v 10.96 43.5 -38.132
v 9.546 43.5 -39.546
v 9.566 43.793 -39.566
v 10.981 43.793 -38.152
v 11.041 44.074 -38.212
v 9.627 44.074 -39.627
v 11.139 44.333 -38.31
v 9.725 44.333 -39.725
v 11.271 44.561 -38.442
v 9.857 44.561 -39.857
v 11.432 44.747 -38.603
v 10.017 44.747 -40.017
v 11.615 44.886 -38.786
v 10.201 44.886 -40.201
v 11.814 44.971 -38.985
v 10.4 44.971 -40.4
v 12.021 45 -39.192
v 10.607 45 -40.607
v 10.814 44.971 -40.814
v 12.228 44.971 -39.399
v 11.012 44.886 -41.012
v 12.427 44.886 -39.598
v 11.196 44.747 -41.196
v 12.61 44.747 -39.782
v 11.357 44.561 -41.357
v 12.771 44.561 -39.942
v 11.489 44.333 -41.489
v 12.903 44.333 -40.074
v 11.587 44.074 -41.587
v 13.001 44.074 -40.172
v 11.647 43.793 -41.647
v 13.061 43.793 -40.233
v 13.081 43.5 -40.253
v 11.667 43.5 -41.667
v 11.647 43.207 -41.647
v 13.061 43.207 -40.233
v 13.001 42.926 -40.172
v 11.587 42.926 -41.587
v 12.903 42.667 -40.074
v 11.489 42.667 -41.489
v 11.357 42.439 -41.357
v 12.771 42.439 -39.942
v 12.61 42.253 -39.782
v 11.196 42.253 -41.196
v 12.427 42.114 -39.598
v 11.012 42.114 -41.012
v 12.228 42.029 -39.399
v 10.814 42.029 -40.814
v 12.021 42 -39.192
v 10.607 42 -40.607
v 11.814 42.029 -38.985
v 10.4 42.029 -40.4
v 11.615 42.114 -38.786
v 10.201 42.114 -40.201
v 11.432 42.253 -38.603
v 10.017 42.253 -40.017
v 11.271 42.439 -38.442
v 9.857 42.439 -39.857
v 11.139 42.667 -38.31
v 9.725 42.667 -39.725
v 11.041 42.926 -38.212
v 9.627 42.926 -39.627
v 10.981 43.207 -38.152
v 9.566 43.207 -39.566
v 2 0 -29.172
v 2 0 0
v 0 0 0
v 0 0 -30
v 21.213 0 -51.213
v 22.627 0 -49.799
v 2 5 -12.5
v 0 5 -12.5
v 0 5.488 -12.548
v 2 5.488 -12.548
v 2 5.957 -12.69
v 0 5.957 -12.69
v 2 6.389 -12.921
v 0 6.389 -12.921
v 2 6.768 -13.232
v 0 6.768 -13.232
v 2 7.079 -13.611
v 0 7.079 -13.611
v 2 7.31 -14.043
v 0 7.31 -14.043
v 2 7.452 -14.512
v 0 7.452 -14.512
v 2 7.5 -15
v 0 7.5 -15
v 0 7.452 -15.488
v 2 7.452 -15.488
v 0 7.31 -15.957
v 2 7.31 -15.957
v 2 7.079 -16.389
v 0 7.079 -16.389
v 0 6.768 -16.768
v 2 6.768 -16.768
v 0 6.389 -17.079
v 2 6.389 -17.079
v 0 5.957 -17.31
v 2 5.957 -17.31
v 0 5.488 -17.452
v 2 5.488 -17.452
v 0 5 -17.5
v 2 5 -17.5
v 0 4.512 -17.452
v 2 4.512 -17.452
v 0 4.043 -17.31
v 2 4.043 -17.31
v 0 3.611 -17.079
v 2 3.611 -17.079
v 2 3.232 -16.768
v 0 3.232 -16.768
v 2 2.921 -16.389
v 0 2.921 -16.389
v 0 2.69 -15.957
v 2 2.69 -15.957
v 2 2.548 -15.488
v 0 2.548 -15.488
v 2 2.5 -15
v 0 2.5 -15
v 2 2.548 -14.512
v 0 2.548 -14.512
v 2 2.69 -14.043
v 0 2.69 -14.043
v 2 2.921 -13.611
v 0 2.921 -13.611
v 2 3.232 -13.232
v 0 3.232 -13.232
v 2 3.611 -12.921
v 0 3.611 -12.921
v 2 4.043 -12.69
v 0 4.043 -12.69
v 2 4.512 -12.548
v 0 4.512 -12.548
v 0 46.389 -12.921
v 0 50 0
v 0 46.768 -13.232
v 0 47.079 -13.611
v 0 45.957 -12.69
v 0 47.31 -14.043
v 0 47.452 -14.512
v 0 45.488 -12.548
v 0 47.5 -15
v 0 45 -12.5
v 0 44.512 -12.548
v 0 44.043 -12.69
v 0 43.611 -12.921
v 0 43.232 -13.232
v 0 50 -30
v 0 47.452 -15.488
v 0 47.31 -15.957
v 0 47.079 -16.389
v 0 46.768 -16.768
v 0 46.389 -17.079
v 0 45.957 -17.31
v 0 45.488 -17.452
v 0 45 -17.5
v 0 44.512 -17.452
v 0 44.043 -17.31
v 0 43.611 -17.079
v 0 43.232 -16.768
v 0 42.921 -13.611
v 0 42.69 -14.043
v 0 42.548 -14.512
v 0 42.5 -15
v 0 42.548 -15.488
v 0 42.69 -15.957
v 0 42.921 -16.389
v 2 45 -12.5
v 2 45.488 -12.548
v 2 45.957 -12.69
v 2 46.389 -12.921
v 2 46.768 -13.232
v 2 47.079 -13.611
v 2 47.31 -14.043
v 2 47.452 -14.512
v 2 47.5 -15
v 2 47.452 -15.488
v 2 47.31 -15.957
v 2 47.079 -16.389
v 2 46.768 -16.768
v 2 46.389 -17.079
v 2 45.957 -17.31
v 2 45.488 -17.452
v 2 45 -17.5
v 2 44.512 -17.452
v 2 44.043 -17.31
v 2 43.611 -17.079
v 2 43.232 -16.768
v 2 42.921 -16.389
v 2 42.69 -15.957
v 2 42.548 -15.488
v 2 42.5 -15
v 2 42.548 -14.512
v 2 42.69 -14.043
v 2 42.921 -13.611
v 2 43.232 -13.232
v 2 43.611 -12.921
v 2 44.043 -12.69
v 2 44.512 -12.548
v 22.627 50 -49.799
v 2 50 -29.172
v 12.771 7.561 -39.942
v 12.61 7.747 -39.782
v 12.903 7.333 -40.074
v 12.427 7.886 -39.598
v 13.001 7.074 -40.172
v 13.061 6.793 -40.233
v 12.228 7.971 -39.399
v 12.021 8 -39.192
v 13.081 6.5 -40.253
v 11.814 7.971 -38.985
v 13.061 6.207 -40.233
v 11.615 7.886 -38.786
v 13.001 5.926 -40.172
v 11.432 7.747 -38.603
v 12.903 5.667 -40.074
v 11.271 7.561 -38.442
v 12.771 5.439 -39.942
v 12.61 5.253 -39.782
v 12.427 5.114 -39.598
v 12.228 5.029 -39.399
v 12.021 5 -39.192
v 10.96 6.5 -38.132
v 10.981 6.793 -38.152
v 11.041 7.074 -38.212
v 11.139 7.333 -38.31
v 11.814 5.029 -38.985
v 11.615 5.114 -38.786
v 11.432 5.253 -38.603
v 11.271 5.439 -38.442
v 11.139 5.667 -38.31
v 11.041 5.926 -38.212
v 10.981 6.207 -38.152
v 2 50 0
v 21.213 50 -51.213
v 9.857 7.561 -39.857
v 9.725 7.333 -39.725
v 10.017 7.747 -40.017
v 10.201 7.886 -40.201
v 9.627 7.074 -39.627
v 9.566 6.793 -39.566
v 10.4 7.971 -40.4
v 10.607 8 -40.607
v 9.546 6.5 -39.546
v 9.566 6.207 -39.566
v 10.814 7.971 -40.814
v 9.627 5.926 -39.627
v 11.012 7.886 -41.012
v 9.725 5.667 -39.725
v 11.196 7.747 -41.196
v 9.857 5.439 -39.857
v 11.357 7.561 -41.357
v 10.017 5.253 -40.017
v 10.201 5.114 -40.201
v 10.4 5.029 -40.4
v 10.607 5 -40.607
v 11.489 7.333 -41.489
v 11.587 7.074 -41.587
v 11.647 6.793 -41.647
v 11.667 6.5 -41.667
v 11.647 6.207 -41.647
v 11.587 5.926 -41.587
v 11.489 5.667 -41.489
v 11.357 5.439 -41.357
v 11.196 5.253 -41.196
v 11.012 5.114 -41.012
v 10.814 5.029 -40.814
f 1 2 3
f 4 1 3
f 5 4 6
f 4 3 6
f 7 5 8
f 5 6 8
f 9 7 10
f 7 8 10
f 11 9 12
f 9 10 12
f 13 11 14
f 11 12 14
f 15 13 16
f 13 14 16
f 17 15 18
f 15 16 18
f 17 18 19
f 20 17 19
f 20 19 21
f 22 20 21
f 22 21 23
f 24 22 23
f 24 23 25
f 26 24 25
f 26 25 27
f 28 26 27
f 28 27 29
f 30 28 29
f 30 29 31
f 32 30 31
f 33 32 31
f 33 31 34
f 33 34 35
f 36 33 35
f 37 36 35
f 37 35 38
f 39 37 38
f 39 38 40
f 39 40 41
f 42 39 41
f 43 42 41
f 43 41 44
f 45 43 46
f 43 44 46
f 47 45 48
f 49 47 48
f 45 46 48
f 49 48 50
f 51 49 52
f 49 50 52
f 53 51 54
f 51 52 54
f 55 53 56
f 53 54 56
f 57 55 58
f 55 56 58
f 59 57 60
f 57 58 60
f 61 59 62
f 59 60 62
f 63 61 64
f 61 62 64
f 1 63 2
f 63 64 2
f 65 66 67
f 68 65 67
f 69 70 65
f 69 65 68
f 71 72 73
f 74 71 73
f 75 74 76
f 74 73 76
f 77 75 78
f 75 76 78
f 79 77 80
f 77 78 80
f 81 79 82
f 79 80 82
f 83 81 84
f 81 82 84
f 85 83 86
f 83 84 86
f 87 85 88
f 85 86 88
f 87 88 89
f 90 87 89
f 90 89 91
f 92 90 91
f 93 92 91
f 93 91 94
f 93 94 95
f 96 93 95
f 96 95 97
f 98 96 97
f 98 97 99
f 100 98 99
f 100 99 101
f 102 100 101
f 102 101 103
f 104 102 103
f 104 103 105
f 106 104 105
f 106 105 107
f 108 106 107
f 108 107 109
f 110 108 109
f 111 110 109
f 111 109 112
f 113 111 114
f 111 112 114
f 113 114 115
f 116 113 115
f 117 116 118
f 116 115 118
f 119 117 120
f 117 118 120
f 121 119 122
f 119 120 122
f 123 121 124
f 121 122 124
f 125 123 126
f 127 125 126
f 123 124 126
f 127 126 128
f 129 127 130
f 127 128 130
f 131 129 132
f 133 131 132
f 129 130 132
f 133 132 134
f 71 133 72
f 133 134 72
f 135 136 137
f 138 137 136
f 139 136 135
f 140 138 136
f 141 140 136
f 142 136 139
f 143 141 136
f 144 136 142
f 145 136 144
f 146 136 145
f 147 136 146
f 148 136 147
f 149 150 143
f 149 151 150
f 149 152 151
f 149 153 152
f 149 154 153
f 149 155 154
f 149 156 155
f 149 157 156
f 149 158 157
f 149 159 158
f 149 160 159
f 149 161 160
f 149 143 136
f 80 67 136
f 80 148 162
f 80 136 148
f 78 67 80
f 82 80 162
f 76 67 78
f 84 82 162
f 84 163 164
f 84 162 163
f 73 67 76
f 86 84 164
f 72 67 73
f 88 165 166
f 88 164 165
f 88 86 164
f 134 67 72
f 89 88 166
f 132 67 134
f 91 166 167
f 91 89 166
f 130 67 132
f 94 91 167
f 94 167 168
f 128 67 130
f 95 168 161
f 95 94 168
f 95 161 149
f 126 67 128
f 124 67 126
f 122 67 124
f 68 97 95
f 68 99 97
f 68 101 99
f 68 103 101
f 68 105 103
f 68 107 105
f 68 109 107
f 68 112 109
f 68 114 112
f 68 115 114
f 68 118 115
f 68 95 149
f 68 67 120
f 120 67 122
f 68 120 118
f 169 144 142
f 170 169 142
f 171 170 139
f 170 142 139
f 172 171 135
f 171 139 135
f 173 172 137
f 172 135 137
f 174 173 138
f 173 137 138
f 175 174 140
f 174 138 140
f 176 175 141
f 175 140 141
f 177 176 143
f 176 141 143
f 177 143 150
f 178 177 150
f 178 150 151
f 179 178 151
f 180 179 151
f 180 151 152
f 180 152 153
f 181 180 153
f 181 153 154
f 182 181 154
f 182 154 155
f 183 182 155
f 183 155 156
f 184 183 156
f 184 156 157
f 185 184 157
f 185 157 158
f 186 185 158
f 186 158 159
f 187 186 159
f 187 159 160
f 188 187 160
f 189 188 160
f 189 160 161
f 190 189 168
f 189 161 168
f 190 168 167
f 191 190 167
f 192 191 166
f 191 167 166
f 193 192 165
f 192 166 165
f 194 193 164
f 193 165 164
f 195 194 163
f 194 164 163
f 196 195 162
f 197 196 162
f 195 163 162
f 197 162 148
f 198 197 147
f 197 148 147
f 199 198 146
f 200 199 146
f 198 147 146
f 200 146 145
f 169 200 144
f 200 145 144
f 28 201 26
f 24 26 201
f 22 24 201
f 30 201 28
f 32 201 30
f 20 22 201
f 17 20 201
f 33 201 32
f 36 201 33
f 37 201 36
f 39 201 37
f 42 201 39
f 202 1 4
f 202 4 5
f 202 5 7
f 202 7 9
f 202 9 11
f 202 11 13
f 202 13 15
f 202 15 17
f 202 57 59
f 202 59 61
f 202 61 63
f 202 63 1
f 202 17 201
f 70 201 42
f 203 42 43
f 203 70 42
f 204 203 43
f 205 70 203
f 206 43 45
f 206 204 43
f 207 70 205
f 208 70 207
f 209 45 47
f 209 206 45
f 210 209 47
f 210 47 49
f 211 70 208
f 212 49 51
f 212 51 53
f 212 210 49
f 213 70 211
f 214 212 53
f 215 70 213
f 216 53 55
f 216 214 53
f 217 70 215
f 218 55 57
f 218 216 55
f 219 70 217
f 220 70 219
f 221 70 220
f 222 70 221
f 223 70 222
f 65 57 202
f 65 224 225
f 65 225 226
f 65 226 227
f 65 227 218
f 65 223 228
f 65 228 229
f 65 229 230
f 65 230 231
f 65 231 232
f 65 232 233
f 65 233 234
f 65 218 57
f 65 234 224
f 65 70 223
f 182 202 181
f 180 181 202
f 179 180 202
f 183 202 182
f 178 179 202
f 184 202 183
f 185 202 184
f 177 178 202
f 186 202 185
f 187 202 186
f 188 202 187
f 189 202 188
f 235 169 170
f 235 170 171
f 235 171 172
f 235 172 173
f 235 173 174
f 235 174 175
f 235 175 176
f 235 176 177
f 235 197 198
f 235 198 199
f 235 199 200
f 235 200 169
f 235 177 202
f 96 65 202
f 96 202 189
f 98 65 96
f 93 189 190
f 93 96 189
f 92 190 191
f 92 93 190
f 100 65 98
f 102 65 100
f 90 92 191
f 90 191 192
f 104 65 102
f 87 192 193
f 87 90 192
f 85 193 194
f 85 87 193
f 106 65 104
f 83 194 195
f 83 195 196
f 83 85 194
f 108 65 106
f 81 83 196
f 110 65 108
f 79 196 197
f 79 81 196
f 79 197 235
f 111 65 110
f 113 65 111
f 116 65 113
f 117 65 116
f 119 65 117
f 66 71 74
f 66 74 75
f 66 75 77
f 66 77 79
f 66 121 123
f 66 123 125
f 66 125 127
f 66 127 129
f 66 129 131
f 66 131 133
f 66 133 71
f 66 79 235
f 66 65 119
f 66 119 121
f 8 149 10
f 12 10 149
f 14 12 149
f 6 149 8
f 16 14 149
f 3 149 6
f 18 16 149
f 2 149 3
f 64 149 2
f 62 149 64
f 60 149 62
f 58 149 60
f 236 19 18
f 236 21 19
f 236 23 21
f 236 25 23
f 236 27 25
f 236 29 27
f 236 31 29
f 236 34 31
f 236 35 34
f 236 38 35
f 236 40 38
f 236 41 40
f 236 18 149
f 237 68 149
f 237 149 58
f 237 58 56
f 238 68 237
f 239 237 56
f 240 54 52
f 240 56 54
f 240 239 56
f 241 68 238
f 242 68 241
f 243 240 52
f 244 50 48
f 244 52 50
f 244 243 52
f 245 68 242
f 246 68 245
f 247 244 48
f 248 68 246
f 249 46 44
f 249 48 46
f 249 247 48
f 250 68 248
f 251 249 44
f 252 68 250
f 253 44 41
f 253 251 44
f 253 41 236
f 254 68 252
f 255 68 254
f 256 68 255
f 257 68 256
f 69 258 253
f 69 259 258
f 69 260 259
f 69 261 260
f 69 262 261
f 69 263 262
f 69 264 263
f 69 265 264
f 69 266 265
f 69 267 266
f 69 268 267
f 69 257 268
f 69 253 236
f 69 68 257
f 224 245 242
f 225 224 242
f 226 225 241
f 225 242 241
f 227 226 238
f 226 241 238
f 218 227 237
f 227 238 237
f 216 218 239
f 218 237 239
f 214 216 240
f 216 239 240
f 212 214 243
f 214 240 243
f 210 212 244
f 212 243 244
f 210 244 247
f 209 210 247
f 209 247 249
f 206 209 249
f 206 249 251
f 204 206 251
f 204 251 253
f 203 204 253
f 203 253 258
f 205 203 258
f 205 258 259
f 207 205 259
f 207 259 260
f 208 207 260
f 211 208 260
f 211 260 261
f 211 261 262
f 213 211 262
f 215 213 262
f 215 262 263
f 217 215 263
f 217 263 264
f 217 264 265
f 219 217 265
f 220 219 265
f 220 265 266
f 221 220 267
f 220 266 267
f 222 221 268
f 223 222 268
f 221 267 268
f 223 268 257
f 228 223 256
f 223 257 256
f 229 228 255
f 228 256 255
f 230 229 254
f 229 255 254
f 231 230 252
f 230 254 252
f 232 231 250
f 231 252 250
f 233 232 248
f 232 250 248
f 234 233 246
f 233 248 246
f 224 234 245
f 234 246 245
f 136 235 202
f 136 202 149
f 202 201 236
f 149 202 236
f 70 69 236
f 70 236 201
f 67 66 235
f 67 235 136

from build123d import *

# Parameters (mm, degrees)
EXTRUSION1_DEPTH = 50
EXTRUSION2_REACH = 24.627
ESQUISSE3_R      = 2.5
EXTRUSION3_REACH = 39.213
ESQUISSE4_R      = 1.5


with BuildPart() as part:
    # Esquisse1 → Extrusion1 (new body)
    with BuildSketch(Plane(origin=(0, 0, 0), x_dir=(1, 0, 0), z_dir=(0, 1, 0))):
        Polygon((0, 0), (0, 30), (21.213203436, 51.213203436), (22.627416998, 49.798989873), (2, 29.171572875), (2, 0), align=None)
    extrude(amount=EXTRUSION1_DEPTH)

    # Esquisse3 → Extrusion2 (cut, up to next)
    with BuildSketch(Plane.ZY, mode=Mode.PRIVATE) as extrusion2_sk1:
        with Locations((-15, 5)):
            Circle(ESQUISSE3_R)
    extrusion2_tool1 = extrude(extrusion2_sk1.sketch, amount=-EXTRUSION2_REACH, mode=Mode.PRIVATE) & part.part
    add(extrusion2_tool1.solids().sort_by_distance((0, 5, -15))[0], mode=Mode.SUBTRACT)
    # Esquisse3 → Extrusion2 (cut, up to next)
    with BuildSketch(Plane.ZY, mode=Mode.PRIVATE) as extrusion2_sk2:
        with Locations((-15, 45)):
            Circle(ESQUISSE3_R)
    extrusion2_tool2 = extrude(extrusion2_sk2.sketch, amount=-EXTRUSION2_REACH, mode=Mode.PRIVATE) & part.part
    add(extrusion2_tool2.solids().sort_by_distance((0, 45, -15))[0], mode=Mode.SUBTRACT)

    # Esquisse4 → Extrusion3 (cut, up to next)
    with BuildSketch(Plane(origin=(-15, 0, -15), x_dir=(-0.707106781, 0, 0.707106781), z_dir=(-0.707106781, 0, -0.707106781)), mode=Mode.PRIVATE) as extrusion3_sk1:
        with Locations((-36.213203436, 43.5)):
            Circle(ESQUISSE4_R)
    extrusion3_tool1 = extrude(extrusion3_sk1.sketch, amount=-EXTRUSION3_REACH, mode=Mode.PRIVATE) & part.part
    add(extrusion3_tool1.solids().sort_by_distance((10.606602, 43.5, -40.606602))[0], mode=Mode.SUBTRACT)
    # Esquisse4 → Extrusion3 (cut, up to next)
    with BuildSketch(Plane(origin=(-15, 0, -15), x_dir=(-0.707106781, 0, 0.707106781), z_dir=(-0.707106781, 0, -0.707106781)), mode=Mode.PRIVATE) as extrusion3_sk2:
        with Locations((-36.213203436, 6.5)):
            Circle(ESQUISSE4_R)
    extrusion3_tool2 = extrude(extrusion3_sk2.sketch, amount=-EXTRUSION3_REACH, mode=Mode.PRIVATE) & part.part
    add(extrusion3_tool2.solids().sort_by_distance((10.606602, 6.5, -40.606602))[0], mode=Mode.SUBTRACT)


solid = part.part
